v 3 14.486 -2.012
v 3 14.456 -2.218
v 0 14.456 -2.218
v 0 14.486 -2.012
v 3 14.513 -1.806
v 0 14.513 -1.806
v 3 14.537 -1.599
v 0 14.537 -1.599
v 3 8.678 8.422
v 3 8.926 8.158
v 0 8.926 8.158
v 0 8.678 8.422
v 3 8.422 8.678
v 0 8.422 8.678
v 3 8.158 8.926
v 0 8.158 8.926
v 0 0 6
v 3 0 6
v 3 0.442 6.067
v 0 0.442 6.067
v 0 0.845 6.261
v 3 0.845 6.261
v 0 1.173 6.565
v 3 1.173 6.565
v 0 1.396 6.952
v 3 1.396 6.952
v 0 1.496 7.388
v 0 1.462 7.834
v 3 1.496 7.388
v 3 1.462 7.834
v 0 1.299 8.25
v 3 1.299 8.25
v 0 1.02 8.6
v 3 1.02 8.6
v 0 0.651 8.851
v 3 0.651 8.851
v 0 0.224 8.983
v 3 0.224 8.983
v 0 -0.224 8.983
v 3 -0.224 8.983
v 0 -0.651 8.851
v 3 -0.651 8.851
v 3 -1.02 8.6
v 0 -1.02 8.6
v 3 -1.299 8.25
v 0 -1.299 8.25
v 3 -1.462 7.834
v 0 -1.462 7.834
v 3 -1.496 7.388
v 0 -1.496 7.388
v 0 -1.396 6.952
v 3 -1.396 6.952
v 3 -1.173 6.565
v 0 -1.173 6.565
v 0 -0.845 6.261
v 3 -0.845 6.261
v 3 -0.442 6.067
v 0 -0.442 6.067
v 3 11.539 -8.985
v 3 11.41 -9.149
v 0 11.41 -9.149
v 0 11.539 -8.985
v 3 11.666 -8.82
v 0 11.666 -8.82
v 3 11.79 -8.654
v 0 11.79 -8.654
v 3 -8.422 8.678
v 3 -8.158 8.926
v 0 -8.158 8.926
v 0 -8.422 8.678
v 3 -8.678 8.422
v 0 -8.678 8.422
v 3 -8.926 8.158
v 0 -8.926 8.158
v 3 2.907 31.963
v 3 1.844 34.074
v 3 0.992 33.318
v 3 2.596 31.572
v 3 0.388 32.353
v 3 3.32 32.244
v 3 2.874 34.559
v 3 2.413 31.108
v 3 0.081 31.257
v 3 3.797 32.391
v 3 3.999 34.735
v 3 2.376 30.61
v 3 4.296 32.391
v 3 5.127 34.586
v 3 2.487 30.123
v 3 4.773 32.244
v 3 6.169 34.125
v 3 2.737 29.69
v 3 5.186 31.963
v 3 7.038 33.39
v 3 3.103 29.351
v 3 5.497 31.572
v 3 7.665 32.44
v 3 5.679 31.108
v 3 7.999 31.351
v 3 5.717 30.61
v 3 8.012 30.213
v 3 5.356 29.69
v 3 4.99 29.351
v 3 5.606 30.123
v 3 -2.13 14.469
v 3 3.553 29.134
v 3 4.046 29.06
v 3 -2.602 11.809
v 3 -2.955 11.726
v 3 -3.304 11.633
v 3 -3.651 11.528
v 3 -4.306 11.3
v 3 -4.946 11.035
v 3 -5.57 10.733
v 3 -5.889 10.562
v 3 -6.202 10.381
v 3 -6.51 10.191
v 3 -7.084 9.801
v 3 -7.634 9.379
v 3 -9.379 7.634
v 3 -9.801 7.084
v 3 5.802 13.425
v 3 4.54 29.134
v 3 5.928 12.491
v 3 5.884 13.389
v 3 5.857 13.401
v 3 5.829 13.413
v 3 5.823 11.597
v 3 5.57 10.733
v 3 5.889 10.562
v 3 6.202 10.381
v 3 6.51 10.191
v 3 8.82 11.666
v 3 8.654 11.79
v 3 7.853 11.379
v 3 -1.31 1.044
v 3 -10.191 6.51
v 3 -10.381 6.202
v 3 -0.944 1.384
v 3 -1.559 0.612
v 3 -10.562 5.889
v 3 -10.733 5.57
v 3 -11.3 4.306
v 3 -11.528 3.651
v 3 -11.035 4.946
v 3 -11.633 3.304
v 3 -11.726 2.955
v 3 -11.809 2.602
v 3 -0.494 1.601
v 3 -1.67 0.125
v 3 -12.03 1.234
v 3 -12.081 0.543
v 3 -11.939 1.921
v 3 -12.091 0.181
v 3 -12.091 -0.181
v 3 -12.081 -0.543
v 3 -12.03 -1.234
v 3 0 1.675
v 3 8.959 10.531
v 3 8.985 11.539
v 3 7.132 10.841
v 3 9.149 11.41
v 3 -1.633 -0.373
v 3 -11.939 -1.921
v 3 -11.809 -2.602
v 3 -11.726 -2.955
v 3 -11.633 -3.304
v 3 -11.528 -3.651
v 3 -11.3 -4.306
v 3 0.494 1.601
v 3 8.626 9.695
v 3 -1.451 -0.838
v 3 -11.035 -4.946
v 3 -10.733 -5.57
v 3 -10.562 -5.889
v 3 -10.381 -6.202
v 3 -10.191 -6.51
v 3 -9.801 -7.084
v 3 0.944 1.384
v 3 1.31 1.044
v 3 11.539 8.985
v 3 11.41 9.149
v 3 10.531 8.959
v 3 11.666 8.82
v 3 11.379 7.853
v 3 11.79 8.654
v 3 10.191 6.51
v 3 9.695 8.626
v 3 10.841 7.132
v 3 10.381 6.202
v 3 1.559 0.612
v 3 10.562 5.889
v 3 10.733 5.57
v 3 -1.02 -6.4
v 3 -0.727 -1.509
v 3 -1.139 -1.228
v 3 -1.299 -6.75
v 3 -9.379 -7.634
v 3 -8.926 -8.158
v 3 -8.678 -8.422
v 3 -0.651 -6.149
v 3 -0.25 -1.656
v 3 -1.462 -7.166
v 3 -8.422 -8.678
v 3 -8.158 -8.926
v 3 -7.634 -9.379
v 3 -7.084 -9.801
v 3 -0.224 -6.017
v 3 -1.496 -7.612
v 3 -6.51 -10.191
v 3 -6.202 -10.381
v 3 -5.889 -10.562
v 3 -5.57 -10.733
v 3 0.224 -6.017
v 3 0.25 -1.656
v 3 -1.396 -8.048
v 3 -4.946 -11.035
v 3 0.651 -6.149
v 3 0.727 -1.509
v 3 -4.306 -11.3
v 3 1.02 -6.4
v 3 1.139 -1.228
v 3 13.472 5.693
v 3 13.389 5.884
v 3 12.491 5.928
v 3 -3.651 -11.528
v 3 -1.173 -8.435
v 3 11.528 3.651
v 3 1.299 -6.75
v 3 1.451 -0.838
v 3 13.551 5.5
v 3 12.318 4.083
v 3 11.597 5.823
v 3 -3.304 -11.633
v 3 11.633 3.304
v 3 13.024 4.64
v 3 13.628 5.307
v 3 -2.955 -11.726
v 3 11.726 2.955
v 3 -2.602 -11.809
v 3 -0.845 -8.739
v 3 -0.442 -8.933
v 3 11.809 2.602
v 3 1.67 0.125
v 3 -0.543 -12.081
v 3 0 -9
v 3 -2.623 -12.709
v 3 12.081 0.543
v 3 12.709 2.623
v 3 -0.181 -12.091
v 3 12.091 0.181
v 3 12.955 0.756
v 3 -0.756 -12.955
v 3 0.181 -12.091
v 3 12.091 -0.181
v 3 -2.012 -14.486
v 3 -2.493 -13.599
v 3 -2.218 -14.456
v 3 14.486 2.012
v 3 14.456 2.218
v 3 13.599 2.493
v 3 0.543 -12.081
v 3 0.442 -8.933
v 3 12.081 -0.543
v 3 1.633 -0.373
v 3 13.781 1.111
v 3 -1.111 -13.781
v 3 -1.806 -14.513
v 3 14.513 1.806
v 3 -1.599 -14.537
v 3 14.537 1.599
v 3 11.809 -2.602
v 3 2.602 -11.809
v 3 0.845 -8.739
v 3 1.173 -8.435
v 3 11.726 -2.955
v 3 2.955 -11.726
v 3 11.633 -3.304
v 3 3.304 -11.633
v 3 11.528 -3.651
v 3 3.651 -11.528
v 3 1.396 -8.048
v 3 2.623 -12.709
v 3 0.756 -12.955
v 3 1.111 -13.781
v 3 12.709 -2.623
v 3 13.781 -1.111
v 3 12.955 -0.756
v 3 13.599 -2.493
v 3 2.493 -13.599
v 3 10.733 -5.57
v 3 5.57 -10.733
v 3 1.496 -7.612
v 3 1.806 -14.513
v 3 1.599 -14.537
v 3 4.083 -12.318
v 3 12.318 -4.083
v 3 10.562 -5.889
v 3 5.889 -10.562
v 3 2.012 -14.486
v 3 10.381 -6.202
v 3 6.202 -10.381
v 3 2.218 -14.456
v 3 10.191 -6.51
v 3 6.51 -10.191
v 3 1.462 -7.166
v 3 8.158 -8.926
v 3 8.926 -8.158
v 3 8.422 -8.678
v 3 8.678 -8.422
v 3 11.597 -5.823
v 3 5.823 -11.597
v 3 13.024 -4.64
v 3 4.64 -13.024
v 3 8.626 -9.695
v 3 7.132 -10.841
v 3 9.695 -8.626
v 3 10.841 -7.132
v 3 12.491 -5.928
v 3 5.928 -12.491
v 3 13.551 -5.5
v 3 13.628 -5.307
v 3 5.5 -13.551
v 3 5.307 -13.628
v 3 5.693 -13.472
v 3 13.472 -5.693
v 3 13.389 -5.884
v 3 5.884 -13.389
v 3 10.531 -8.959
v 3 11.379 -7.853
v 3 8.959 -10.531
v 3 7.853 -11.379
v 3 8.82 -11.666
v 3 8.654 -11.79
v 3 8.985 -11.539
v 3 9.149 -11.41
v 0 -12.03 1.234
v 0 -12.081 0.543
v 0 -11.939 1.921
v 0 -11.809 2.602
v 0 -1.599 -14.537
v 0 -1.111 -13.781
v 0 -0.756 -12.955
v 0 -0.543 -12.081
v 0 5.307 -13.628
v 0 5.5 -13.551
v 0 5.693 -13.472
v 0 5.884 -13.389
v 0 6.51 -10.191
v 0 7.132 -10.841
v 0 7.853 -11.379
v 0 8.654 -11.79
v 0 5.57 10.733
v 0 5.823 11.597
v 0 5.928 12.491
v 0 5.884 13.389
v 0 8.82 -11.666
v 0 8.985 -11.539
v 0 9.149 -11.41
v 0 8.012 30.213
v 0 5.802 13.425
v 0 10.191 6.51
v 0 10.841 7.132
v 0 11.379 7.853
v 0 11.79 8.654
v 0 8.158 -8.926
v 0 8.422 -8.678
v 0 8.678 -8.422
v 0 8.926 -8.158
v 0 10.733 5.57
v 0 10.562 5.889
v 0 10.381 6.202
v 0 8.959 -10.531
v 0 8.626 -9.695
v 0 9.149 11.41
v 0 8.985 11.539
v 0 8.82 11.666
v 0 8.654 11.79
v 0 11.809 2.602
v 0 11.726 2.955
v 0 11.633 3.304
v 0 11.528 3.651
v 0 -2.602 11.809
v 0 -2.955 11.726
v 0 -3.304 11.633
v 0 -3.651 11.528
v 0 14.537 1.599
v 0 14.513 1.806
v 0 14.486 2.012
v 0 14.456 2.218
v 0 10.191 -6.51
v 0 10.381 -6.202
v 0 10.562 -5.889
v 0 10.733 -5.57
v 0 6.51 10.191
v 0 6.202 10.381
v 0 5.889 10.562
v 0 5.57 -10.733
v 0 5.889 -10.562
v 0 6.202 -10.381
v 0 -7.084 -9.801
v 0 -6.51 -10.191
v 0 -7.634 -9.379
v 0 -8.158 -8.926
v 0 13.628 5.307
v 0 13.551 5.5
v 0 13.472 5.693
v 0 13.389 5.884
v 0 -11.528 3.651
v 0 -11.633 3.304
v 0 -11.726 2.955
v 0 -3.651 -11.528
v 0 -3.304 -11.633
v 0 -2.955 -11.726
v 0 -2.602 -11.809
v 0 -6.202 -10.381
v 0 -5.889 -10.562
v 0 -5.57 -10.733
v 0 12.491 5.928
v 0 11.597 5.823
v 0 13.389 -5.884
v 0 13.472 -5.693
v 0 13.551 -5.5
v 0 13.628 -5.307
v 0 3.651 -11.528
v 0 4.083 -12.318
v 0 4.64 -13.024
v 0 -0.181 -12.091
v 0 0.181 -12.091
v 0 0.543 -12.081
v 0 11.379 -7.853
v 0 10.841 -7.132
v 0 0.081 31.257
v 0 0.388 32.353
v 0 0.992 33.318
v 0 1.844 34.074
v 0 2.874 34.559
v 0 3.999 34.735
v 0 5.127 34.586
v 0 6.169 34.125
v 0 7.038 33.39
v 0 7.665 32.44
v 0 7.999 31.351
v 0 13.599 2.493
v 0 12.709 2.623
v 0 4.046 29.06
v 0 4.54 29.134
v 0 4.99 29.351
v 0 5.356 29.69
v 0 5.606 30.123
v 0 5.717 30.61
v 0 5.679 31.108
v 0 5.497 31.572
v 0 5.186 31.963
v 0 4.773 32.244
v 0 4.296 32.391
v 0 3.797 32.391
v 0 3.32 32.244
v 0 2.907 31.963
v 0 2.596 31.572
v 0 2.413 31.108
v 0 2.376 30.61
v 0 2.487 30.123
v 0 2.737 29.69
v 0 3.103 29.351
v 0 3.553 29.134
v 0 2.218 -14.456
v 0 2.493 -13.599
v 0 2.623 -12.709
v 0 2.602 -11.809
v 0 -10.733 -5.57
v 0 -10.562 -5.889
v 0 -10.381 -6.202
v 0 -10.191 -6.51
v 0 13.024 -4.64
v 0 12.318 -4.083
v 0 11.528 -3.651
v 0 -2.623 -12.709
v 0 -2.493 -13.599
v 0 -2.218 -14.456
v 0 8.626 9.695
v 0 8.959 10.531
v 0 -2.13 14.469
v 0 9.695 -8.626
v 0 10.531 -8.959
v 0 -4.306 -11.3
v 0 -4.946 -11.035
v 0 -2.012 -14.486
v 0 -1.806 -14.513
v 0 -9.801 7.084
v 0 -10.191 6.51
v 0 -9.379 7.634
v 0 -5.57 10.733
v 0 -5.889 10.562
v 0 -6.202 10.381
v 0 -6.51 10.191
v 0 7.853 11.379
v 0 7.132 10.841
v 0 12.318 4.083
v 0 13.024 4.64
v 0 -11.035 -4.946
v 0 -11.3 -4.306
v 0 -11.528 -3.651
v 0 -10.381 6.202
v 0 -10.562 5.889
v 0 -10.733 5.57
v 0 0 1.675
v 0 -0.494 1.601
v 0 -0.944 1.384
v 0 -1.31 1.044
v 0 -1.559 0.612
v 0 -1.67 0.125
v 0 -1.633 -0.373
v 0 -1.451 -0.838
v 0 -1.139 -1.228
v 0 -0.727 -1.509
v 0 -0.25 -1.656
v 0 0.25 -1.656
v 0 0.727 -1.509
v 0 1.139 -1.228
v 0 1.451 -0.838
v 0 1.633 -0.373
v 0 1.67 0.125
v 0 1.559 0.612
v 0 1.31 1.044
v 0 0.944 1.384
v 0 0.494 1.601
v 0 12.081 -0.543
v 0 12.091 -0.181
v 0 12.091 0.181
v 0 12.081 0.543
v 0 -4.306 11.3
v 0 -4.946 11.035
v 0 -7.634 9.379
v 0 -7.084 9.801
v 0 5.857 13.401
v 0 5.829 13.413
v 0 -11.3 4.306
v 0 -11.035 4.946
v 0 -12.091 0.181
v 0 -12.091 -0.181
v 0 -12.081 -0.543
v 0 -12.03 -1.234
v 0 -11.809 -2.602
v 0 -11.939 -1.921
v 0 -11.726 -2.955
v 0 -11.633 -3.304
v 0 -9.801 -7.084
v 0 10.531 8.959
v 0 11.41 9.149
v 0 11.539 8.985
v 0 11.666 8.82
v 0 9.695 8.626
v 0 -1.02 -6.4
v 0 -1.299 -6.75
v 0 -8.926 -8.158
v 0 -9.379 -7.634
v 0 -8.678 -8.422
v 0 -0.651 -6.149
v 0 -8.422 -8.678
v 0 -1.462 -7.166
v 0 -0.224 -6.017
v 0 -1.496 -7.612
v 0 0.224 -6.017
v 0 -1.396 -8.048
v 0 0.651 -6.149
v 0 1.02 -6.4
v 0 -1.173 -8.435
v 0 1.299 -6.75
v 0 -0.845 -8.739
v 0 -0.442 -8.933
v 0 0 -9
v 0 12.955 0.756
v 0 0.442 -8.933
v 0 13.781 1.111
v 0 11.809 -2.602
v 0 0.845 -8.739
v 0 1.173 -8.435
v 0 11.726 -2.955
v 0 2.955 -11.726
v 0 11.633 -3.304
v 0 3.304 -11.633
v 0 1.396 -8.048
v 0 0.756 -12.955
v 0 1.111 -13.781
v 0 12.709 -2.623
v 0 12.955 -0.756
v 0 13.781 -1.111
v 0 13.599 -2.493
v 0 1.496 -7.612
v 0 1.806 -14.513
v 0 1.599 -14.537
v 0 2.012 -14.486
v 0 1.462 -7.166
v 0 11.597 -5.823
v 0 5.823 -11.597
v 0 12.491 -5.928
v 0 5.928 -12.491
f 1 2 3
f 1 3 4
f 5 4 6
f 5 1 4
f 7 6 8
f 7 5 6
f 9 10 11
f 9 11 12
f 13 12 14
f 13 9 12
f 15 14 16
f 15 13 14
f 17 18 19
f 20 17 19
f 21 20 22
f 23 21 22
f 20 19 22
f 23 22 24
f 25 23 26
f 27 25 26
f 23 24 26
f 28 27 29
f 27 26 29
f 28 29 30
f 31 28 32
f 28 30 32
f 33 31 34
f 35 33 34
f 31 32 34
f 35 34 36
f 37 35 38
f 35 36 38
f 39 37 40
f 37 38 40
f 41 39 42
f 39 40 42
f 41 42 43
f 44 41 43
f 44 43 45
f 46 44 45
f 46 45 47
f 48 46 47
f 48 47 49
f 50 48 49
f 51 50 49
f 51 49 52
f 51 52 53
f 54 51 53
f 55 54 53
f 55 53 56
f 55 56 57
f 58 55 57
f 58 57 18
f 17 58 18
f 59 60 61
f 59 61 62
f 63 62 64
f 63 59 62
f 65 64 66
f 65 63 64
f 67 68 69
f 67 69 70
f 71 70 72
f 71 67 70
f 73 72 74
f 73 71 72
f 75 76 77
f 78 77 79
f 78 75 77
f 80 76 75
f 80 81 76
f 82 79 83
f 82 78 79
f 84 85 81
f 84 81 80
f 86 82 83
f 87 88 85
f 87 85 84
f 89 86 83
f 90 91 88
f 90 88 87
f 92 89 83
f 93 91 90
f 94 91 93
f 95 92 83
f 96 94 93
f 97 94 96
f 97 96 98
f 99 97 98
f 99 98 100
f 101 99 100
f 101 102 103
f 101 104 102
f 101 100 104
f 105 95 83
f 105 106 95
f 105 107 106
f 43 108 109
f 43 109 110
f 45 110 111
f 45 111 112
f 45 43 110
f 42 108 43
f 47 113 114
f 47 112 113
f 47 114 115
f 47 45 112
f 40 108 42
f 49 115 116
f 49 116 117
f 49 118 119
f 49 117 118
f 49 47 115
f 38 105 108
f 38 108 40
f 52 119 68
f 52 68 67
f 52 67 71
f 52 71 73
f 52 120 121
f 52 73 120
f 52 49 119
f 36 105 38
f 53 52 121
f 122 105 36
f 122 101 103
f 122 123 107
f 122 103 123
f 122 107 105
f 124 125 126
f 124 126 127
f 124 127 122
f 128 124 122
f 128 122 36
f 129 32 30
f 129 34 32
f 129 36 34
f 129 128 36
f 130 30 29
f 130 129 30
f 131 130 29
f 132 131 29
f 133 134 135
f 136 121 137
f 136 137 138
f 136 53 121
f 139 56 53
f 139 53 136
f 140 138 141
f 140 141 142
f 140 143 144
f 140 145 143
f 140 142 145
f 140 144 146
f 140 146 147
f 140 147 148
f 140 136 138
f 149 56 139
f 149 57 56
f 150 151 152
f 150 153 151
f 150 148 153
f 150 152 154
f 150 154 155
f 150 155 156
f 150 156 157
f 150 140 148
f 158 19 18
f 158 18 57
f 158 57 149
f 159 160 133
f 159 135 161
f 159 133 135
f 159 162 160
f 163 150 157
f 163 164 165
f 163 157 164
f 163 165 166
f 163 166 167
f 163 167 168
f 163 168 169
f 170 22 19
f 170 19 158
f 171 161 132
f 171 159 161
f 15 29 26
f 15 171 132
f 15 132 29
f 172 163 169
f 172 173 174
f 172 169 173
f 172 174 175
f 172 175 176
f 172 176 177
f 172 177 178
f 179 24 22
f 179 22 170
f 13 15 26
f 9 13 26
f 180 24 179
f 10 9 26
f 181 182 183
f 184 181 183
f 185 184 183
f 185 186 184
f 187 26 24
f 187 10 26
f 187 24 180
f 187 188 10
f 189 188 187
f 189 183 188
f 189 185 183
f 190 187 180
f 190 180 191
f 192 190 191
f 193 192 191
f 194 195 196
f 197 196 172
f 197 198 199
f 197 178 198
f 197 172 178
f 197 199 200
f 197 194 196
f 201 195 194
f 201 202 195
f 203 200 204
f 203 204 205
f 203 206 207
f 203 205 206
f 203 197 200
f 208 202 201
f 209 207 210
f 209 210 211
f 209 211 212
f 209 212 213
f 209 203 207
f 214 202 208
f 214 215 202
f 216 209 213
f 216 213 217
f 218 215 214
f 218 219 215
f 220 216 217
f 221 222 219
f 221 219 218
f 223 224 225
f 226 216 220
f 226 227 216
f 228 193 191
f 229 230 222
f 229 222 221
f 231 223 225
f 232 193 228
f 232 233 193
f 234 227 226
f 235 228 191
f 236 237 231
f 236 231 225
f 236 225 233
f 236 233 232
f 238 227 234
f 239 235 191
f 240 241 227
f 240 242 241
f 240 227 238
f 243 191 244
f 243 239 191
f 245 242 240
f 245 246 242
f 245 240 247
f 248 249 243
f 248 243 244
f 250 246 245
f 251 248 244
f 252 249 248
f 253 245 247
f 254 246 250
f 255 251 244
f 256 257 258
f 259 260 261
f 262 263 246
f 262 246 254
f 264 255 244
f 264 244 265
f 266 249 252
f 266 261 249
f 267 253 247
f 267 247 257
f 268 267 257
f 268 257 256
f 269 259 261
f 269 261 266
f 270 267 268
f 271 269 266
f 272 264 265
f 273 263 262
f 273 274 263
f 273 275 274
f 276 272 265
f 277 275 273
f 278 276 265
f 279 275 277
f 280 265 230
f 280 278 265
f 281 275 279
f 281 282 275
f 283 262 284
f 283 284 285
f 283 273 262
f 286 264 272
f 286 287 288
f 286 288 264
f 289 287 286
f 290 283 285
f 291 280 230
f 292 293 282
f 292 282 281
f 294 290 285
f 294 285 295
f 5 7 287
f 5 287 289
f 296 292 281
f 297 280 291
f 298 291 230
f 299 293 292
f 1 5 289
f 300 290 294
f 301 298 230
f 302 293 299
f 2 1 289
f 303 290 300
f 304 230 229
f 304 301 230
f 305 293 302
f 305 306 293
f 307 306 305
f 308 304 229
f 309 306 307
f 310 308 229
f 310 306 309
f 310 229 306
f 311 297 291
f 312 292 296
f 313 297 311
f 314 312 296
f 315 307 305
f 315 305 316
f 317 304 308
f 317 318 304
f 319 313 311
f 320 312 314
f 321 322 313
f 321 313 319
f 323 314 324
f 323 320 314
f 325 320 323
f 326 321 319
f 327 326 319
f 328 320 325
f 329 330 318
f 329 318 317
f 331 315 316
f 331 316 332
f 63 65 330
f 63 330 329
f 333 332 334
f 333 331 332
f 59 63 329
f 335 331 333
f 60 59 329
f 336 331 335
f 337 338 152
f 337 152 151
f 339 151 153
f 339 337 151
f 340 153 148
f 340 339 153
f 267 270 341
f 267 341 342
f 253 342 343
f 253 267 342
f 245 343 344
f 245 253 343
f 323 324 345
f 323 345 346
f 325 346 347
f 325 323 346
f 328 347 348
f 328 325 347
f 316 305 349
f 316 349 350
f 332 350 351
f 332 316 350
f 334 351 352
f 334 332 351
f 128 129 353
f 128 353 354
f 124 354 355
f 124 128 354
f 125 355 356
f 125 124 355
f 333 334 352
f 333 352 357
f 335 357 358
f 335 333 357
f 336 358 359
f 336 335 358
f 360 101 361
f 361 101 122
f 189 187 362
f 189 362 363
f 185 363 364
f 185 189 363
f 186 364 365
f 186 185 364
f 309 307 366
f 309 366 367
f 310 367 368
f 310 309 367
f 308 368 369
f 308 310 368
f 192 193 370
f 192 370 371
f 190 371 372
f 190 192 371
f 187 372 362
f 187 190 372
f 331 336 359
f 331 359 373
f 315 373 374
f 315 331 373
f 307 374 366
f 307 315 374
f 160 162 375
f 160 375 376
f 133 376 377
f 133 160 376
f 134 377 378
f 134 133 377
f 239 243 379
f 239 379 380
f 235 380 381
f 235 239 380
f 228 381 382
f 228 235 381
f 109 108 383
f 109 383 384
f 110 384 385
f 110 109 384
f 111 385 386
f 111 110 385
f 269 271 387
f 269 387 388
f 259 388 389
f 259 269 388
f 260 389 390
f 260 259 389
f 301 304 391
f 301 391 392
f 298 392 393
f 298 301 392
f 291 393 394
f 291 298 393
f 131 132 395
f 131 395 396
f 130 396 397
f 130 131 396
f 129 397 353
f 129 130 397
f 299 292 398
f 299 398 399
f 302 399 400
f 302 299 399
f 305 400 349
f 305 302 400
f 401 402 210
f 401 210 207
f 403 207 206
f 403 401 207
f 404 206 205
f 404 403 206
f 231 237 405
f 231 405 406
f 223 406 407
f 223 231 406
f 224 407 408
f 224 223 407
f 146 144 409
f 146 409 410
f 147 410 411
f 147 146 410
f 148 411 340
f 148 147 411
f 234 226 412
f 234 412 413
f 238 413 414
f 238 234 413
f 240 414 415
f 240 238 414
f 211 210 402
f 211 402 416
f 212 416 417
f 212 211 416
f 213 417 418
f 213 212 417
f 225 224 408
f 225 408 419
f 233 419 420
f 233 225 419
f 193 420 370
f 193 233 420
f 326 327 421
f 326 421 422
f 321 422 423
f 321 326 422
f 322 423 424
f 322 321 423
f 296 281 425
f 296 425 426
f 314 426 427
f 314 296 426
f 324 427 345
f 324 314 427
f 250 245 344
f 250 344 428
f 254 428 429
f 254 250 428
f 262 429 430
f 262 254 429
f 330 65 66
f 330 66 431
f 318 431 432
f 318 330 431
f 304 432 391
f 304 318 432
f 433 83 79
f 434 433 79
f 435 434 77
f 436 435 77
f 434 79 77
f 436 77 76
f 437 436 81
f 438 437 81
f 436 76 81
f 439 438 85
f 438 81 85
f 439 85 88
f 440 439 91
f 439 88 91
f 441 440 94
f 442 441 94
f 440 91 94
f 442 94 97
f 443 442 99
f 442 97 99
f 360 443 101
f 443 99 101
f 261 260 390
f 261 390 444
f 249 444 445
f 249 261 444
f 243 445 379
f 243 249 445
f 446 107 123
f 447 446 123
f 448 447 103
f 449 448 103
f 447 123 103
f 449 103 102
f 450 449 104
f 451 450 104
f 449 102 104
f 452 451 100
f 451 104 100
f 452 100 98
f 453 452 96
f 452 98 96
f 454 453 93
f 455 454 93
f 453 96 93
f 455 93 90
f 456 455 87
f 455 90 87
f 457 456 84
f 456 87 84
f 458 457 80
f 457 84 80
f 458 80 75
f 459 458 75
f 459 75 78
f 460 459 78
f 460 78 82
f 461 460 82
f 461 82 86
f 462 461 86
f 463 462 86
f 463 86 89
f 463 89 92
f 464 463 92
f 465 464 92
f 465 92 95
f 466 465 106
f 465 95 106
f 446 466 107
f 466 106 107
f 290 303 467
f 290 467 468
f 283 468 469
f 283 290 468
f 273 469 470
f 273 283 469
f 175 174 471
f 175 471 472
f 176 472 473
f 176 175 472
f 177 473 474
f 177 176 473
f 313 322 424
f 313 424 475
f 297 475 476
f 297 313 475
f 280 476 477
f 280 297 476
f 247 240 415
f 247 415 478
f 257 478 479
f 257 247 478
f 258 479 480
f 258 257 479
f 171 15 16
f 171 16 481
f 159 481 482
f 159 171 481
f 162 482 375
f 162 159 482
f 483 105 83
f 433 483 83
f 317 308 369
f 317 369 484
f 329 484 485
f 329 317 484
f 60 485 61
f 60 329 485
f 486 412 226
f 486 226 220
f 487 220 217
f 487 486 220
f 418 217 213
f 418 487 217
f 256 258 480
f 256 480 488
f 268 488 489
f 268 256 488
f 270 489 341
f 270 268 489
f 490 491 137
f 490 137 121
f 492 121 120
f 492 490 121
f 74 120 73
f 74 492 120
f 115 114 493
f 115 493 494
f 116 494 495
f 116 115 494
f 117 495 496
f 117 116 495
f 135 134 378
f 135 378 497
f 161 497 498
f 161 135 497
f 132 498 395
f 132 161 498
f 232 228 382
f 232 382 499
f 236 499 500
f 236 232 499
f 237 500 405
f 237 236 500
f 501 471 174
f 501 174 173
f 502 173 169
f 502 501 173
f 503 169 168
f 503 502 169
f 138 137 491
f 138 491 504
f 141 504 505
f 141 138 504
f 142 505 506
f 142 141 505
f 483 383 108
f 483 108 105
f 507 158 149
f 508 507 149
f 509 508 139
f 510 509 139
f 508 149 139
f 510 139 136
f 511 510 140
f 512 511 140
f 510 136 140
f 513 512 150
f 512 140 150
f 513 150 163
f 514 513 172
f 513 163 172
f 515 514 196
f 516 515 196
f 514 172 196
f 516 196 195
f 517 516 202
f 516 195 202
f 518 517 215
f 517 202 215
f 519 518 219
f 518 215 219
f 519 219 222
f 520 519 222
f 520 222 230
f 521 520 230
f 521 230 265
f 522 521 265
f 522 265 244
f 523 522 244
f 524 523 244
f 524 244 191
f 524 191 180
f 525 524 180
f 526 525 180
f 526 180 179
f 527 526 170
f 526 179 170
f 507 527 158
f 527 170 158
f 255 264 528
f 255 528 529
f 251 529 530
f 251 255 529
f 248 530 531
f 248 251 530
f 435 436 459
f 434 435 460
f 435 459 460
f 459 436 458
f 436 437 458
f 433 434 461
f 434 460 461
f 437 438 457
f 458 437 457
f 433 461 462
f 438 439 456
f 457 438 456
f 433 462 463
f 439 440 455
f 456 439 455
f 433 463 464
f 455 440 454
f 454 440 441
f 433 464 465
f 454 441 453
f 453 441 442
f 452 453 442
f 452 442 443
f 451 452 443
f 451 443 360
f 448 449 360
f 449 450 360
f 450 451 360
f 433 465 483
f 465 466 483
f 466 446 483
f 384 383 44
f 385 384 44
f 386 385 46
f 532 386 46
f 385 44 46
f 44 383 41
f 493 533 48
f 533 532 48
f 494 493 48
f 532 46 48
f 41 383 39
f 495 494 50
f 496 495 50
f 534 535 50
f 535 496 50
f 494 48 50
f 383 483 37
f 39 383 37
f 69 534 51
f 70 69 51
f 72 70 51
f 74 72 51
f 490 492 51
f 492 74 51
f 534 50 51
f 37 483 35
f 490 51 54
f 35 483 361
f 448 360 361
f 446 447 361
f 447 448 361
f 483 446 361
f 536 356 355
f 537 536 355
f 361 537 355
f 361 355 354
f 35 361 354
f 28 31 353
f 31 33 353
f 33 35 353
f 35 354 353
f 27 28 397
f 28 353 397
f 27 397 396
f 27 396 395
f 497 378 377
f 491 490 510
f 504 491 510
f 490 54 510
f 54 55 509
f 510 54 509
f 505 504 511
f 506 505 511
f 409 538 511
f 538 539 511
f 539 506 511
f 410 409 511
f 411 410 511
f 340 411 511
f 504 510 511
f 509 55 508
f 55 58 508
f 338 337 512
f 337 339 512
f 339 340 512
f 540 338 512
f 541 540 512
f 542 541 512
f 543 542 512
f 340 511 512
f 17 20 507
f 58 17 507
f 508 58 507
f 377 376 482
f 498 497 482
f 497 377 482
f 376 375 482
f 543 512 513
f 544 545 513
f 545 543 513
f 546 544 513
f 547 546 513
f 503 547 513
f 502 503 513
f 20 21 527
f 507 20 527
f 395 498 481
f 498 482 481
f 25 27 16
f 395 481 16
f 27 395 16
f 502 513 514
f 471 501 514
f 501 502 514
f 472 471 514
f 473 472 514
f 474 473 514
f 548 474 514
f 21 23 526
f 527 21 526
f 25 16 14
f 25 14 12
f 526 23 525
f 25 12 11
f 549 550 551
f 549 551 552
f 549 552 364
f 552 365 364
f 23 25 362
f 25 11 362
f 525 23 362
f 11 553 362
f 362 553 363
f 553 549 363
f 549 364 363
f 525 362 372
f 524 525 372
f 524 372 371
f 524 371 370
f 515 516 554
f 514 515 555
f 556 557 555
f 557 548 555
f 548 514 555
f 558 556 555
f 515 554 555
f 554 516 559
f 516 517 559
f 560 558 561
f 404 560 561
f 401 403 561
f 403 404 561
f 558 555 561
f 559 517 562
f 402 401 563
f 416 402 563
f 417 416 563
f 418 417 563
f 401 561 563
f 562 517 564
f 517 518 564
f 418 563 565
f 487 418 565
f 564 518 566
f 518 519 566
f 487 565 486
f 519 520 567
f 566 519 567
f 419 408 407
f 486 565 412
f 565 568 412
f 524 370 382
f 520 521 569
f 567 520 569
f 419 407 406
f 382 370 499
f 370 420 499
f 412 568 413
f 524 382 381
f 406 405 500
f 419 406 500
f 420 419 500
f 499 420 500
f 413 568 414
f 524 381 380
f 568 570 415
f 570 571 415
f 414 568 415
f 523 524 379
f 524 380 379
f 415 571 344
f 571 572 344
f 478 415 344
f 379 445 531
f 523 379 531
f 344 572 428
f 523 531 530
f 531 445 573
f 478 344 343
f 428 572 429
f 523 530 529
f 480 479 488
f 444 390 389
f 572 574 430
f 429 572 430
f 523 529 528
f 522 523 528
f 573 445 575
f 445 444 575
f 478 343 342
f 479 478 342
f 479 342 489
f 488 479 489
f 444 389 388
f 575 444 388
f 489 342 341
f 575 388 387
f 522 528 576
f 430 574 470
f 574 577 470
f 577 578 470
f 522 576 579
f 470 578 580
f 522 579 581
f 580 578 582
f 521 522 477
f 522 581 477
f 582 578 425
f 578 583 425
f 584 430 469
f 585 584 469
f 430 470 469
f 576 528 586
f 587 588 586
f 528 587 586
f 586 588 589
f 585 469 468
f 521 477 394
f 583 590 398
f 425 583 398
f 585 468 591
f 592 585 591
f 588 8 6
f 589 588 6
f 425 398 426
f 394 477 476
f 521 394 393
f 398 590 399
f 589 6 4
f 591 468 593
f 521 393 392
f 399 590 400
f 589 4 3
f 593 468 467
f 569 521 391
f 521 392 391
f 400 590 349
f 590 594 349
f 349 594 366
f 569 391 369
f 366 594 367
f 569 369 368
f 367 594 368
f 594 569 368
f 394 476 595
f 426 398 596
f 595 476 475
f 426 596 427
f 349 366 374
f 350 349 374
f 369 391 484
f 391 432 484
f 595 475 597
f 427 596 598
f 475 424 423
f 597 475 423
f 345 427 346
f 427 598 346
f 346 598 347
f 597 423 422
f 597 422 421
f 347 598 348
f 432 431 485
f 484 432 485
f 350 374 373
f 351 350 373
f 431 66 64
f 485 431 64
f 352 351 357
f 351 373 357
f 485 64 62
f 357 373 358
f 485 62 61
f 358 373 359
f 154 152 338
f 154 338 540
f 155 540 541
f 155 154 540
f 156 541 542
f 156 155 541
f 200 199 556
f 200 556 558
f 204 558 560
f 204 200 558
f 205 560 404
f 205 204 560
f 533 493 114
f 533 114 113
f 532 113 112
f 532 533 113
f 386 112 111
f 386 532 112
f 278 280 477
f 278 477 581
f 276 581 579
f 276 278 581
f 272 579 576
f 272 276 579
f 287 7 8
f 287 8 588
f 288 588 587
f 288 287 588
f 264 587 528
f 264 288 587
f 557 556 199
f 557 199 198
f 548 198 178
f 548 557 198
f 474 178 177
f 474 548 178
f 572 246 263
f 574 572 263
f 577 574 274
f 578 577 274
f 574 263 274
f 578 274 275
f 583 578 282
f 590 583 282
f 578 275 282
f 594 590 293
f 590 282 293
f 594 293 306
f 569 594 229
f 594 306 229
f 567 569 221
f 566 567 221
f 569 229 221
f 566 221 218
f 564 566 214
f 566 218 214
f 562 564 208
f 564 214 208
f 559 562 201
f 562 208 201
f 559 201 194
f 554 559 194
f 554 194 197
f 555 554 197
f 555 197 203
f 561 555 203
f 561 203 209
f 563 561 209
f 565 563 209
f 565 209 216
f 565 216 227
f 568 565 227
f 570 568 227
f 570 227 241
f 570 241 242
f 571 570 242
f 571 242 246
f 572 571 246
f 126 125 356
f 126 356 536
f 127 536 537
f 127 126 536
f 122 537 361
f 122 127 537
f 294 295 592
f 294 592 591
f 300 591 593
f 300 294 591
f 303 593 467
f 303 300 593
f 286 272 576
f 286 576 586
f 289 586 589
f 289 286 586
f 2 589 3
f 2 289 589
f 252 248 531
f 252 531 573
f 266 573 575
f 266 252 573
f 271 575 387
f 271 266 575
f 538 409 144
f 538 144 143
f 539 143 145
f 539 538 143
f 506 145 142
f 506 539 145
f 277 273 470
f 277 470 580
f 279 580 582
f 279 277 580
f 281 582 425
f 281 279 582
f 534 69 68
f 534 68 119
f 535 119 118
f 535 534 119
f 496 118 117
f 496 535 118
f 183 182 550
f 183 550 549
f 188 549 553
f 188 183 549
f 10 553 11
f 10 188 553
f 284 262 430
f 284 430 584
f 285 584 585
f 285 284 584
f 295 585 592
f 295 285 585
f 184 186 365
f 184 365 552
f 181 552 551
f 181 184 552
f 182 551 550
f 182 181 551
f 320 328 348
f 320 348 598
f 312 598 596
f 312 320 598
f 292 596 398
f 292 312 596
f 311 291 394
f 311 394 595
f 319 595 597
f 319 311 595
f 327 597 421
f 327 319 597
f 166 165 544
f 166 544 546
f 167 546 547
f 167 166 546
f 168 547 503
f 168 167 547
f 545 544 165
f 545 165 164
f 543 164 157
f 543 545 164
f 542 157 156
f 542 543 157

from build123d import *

# Parameters (mm, degrees)
SKETCH1_R           = 1.675
BOSS_EXTRUDE1_DEPTH = 3
SKETCH2_R           = 1.675
BOSS_EXTRUDE2_DEPTH = 3
CUT_EXTRUDE1_START  = -3
CUT_EXTRUDE1_DEPTH  = 3
SKETCH4_R           = 1.5
CUT_EXTRUDE2_DEPTH  = 38.773525245


# Read off the part's stored shape, not the designer's step: Cut-Extrude1
with BuildPart() as part:
    # Sketch1 → Boss-Extrude1 (new body)
    with BuildSketch(Plane(origin=(3, 0, 0), x_dir=(0, 0, -1), z_dir=(1, 0, 0))):
        with BuildLine():
            ThreePointArc((-14.537314892, 1.599093719), (-13.375367565, 0.916420874), (-12.080565177, 0.542722358))
            ThreePointArc((-12.080565177, 0.542722358), (-12.09275, 0), (-12.080565177, -0.542722358))
            ThreePointArc((-12.080565177, -0.542722358), (-13.375367565, -0.916420874), (-14.537314892, -1.599093719))
            ThreePointArc((-14.537314892, -1.599093719), (-14.499881098, -1.908945561), (-14.455843809, -2.217928037))
            ThreePointArc((-14.455843809, -2.217928037), (-13.156800143, -2.576605271), (-11.809396783, -2.602450802))
            ThreePointArc((-11.809396783, -2.602450802), (-11.680699536, -3.129834008), (-11.528463019, -3.650909885))
            ThreePointArc((-11.528463019, -3.650909885), (-12.682425791, -4.346994451), (-13.62809199, -5.30713988))
            ThreePointArc((-13.62809199, -5.30713988), (-13.511738163, -5.596745198), (-13.389230859, -5.883801663))
            ThreePointArc((-13.389230859, -5.883801663), (-12.041618533, -5.894040025), (-10.733437515, -5.57027124))
            ThreePointArc((-10.733437515, -5.57027124), (-10.472628702, -6.046375), (-10.190715157, -6.510293938))
            ThreePointArc((-10.190715157, -6.510293938), (-11.125197659, -7.48132754), (-11.79013714, -8.65351323))
            ThreePointArc((-11.79013714, -8.65351323), (-11.602792602, -8.903135899), (-11.410163953, -9.148703928))
            ThreePointArc((-11.410163953, -9.148703928), (-10.105820521, -8.809805691), (-8.926012217, -8.158486898))
            ThreePointArc((-8.926012217, -8.158486898), (-8.550865528, -8.550865528), (-8.158486898, -8.926012217))
            ThreePointArc((-8.158486898, -8.926012217), (-8.809805691, -10.105820521), (-9.148703928, -11.410163953))
            ThreePointArc((-9.148703928, -11.410163953), (-8.903135899, -11.602792602), (-8.65351323, -11.79013714))
            ThreePointArc((-8.65351323, -11.79013714), (-7.48132754, -11.125197659), (-6.510293938, -10.190715157))
            ThreePointArc((-6.510293938, -10.190715157), (-6.046375, -10.472628702), (-5.57027124, -10.733437515))
            ThreePointArc((-5.57027124, -10.733437515), (-5.894040025, -12.041618533), (-5.883801663, -13.389230859))
            ThreePointArc((-5.883801663, -13.389230859), (-5.596745198, -13.511738163), (-5.30713988, -13.62809199))
            ThreePointArc((-5.30713988, -13.62809199), (-4.346994451, -12.682425791), (-3.650909885, -11.528463019))
            ThreePointArc((-3.650909885, -11.528463019), (-3.129834008, -11.680699536), (-2.602450802, -11.809396783))
            ThreePointArc((-2.602450802, -11.809396783), (-2.576605271, -13.156800143), (-2.217928037, -14.455843809))
            ThreePointArc((-2.217928037, -14.455843809), (-1.908945561, -14.499881098), (-1.599093719, -14.537314892))
            ThreePointArc((-1.599093719, -14.537314892), (-0.916420874, -13.375367565), (-0.542722358, -12.080565177))
            ThreePointArc((-0.542722358, -12.080565177), (0, -12.09275), (0.542722358, -12.080565177))
            ThreePointArc((0.542722358, -12.080565177), (0.916420874, -13.375367565), (1.599093719, -14.537314892))
            ThreePointArc((1.599093719, -14.537314892), (1.908945561, -14.499881098), (2.217928037, -14.455843809))
            ThreePointArc((2.217928037, -14.455843809), (2.576605271, -13.156800143), (2.602450802, -11.809396783))
            ThreePointArc((2.602450802, -11.809396783), (3.129834008, -11.680699536), (3.650909885, -11.528463019))
            ThreePointArc((3.650909885, -11.528463019), (4.346994451, -12.682425791), (5.30713988, -13.62809199))
            ThreePointArc((5.30713988, -13.62809199), (5.596745198, -13.511738163), (5.883801663, -13.389230859))
            ThreePointArc((5.883801663, -13.389230859), (5.894040025, -12.041618533), (5.57027124, -10.733437515))
            ThreePointArc((5.57027124, -10.733437515), (6.046375, -10.472628702), (6.510293938, -10.190715157))
            ThreePointArc((6.510293938, -10.190715157), (7.48132754, -11.125197659), (8.65351323, -11.79013714))
            ThreePointArc((8.65351323, -11.79013714), (8.903135899, -11.602792602), (9.148703928, -11.410163953))
            ThreePointArc((9.148703928, -11.410163953), (8.809805691, -10.105820521), (8.158486898, -8.926012217))
            ThreePointArc((8.158486898, -8.926012217), (8.550865528, -8.550865528), (8.926012217, -8.158486898))
            ThreePointArc((8.926012217, -8.158486898), (10.105820521, -8.809805691), (11.410163953, -9.148703928))
            ThreePointArc((11.410163953, -9.148703928), (11.602792602, -8.903135899), (11.79013714, -8.65351323))
            ThreePointArc((11.79013714, -8.65351323), (11.125197659, -7.48132754), (10.190715157, -6.510293938))
            ThreePointArc((10.190715157, -6.510293938), (10.472628702, -6.046375), (10.733437515, -5.57027124))
            ThreePointArc((10.733437515, -5.57027124), (12.041618533, -5.894040025), (13.389230859, -5.883801663))
            ThreePointArc((13.389230859, -5.883801663), (13.511738163, -5.596745198), (13.62809199, -5.30713988))
            ThreePointArc((13.62809199, -5.30713988), (12.682425791, -4.346994451), (11.528463019, -3.650909885))
            ThreePointArc((11.528463019, -3.650909885), (11.680699536, -3.129834008), (11.809396783, -2.602450802))
            ThreePointArc((11.809396783, -2.602450802), (13.156800143, -2.576605271), (14.455843809, -2.217928037))
            ThreePointArc((14.455843809, -2.217928037), (14.499881098, -1.908945561), (14.537314892, -1.599093719))
            ThreePointArc((14.537314892, -1.599093719), (13.375367565, -0.916420874), (12.080565177, -0.542722358))
            ThreePointArc((12.080565177, -0.542722358), (12.09275, 0), (12.080565177, 0.542722358))
            ThreePointArc((12.080565177, 0.542722358), (13.375367565, 0.916420874), (14.537314892, 1.599093719))
            ThreePointArc((14.537314892, 1.599093719), (14.499881098, 1.908945561), (14.455843809, 2.217928037))
            ThreePointArc((14.455843809, 2.217928037), (13.156800143, 2.576605271), (11.809396783, 2.602450802))
            ThreePointArc((11.809396783, 2.602450802), (11.680699536, 3.129834008), (11.528463019, 3.650909885))
            ThreePointArc((11.528463019, 3.650909885), (12.682425791, 4.346994451), (13.62809199, 5.30713988))
            ThreePointArc((13.62809199, 5.30713988), (13.511738163, 5.596745198), (13.389230859, 5.883801663))
            ThreePointArc((13.389230859, 5.883801663), (12.041618533, 5.894040025), (10.733437515, 5.57027124))
            ThreePointArc((10.733437515, 5.57027124), (10.472628702, 6.046375), (10.190715157, 6.510293938))
            ThreePointArc((10.190715157, 6.510293938), (11.125197659, 7.48132754), (11.79013714, 8.65351323))
            ThreePointArc((11.79013714, 8.65351323), (11.602792602, 8.903135899), (11.410163953, 9.148703928))
            ThreePointArc((11.410163953, 9.148703928), (10.105820521, 8.809805691), (8.926012217, 8.158486898))
            ThreePointArc((8.926012217, 8.158486898), (8.550865528, 8.550865528), (8.158486898, 8.926012217))
            ThreePointArc((8.158486898, 8.926012217), (8.809805691, 10.105820521), (9.148703928, 11.410163953))
            ThreePointArc((9.148703928, 11.410163953), (8.903135899, 11.602792602), (8.65351323, 11.79013714))
            ThreePointArc((8.65351323, 11.79013714), (7.48132754, 11.125197659), (6.510293938, 10.190715157))
            ThreePointArc((6.510293938, 10.190715157), (6.046375, 10.472628702), (5.57027124, 10.733437515))
            ThreePointArc((5.57027124, 10.733437515), (5.894040025, 12.041618533), (5.883801663, 13.389230859))
            ThreePointArc((5.883801663, 13.389230859), (5.596745198, 13.511738163), (5.30713988, 13.62809199))
            ThreePointArc((5.30713988, 13.62809199), (4.346994451, 12.682425791), (3.650909885, 11.528463019))
            ThreePointArc((3.650909885, 11.528463019), (3.129834008, 11.680699536), (2.602450802, 11.809396783))
            ThreePointArc((2.602450802, 11.809396783), (2.576605271, 13.156800143), (2.217928037, 14.455843809))
            ThreePointArc((2.217928037, 14.455843809), (1.908945561, 14.499881098), (1.599093719, 14.537314892))
            ThreePointArc((1.599093719, 14.537314892), (0.916420874, 13.375367565), (0.542722358, 12.080565177))
            ThreePointArc((0.542722358, 12.080565177), (0, 12.09275), (-0.542722358, 12.080565177))
            ThreePointArc((-0.542722358, 12.080565177), (-0.916420874, 13.375367565), (-1.599093719, 14.537314892))
            ThreePointArc((-1.599093719, 14.537314892), (-1.908945561, 14.499881098), (-2.217928037, 14.455843809))
            ThreePointArc((-2.217928037, 14.455843809), (-2.576605271, 13.156800143), (-2.602450802, 11.809396783))
            ThreePointArc((-2.602450802, 11.809396783), (-3.129834008, 11.680699536), (-3.650909885, 11.528463019))
            ThreePointArc((-3.650909885, 11.528463019), (-4.346994451, 12.682425791), (-5.30713988, 13.62809199))
            ThreePointArc((-5.30713988, 13.62809199), (-5.596745198, 13.511738163), (-5.883801663, 13.389230859))
            ThreePointArc((-5.883801663, 13.389230859), (-5.894040025, 12.041618533), (-5.57027124, 10.733437515))
            ThreePointArc((-5.57027124, 10.733437515), (-6.046375, 10.472628702), (-6.510293938, 10.190715157))
            ThreePointArc((-6.510293938, 10.190715157), (-7.48132754, 11.125197659), (-8.65351323, 11.79013714))
            ThreePointArc((-8.65351323, 11.79013714), (-8.903135899, 11.602792602), (-9.148703928, 11.410163953))
            ThreePointArc((-9.148703928, 11.410163953), (-8.809805691, 10.105820521), (-8.158486898, 8.926012217))
            ThreePointArc((-8.158486898, 8.926012217), (-8.550865528, 8.550865528), (-8.926012217, 8.158486898))
            ThreePointArc((-8.926012217, 8.158486898), (-10.105820521, 8.809805691), (-11.410163953, 9.148703928))
            ThreePointArc((-11.410163953, 9.148703928), (-11.602792602, 8.903135899), (-11.79013714, 8.65351323))
            ThreePointArc((-11.79013714, 8.65351323), (-11.125197659, 7.48132754), (-10.190715157, 6.510293938))
            ThreePointArc((-10.190715157, 6.510293938), (-10.472628702, 6.046375), (-10.733437515, 5.57027124))
            ThreePointArc((-10.733437515, 5.57027124), (-12.041618533, 5.894040025), (-13.389230859, 5.883801663))
            ThreePointArc((-13.389230859, 5.883801663), (-13.511738163, 5.596745198), (-13.62809199, 5.30713988))
            ThreePointArc((-13.62809199, 5.30713988), (-12.682425791, 4.346994451), (-11.528463019, 3.650909885))
            ThreePointArc((-11.528463019, 3.650909885), (-11.680699536, 3.129834008), (-11.809396783, 2.602450802))
            ThreePointArc((-11.809396783, 2.602450802), (-13.156800143, 2.576605271), (-14.455843809, 2.217928037))
            ThreePointArc((-14.455843809, 2.217928037), (-14.499881098, 1.908945561), (-14.537314892, 1.599093719))
        make_face()
        with Locations(Location((0, 0, 0), (0, 0, 180))):
            Circle(SKETCH1_R, mode=Mode.SUBTRACT)
    extrude(amount=-BOSS_EXTRUDE1_DEPTH)

    # Sketch2 → Boss-Extrude2 (add)
    with BuildSketch(Plane(origin=(3, 0, 0), x_dir=(0, 0, -1), z_dir=(1, 0, 0))):
        with BuildLine():
            Line((-0.522104769, -3.965779445), (-31.256895471, 0.080532513))
            ThreePointArc((-31.256895471, 0.080532513), (-34.700570148, 4.568416728), (-30.212685934, 8.012091404))
            Line((-30.212685934, 8.012091404), (0.522104769, 3.965779445))
            ThreePointArc((0.522104769, 3.965779445), (3.965779445, -0.522104769), (-0.522104769, -3.965779445))
        make_face()
        with Locations((-30.734790703, 4.046311959)):
            Circle(SKETCH2_R, mode=Mode.SUBTRACT)
        with Locations(Location((0, 0, 0), (0, 0, 180))):
            Circle(SKETCH2_R, mode=Mode.SUBTRACT)
    extrude(amount=-BOSS_EXTRUDE2_DEPTH)

    # Cut-Extrude1 outline → Cut-Extrude1 (cut)
    with BuildSketch(Plane(origin=(3, 0, 0), x_dir=(0, 0, -1), z_dir=(1, 0, 0)).offset(CUT_EXTRUDE1_START)):
        with BuildLine():
            ThreePointArc((-14.455843809, -2.217928037), (-13.156800143, -2.576605271), (-11.809396783, -2.602450802))
            Line((-11.809396783, -2.602450802), (-14.469116823, -2.129620475))
            ThreePointArc((-14.469116823, -2.129620475), (-14.462547716, -2.173784387), (-14.455843809, -2.217928037))
        make_face()
        with BuildLine():
            ThreePointArc((11.528463018, -3.650909885), (11.172244217, -4.627695076), (10.733437514, -5.57027124))
            ThreePointArc((10.733437514, -5.57027124), (12.041618534, -5.894040025), (13.389230859, -5.883801663))
            ThreePointArc((13.389230859, -5.883801663), (13.511738163, -5.596745198), (13.62809199, -5.30713988))
            ThreePointArc((13.62809199, -5.30713988), (12.682425791, -4.346994451), (11.528463018, -3.650909885))
        make_face()
        with BuildLine():
            ThreePointArc((10.190715157, -6.510293938), (9.593823606, -7.361599771), (8.926012217, -8.158486898))
            ThreePointArc((8.926012217, -8.158486898), (10.105820521, -8.809805691), (11.410163953, -9.148703928))
            ThreePointArc((11.410163953, -9.148703928), (11.602792602, -8.903135899), (11.79013714, -8.65351323))
            ThreePointArc((11.79013714, -8.65351323), (11.125197659, -7.48132754), (10.190715157, -6.510293938))
        make_face()
        with BuildLine():
            ThreePointArc((8.158486898, -8.926012217), (7.361599771, -9.593823606), (6.510293938, -10.190715157))
            ThreePointArc((6.510293938, -10.190715157), (7.48132754, -11.125197659), (8.65351323, -11.79013714))
            ThreePointArc((8.65351323, -11.79013714), (8.903135899, -11.602792602), (9.148703928, -11.410163953))
            ThreePointArc((9.148703928, -11.410163953), (8.809805691, -10.105820521), (8.158486898, -8.926012217))
        make_face()
        with BuildLine():
            ThreePointArc((5.57027124, -10.733437514), (4.627695077, -11.172244217), (3.650909885, -11.528463019))
            ThreePointArc((3.650909885, -11.528463019), (4.346994451, -12.682425791), (5.30713988, -13.62809199))
            ThreePointArc((5.30713988, -13.62809199), (5.596745198, -13.511738163), (5.883801663, -13.389230859))
            ThreePointArc((5.883801663, -13.389230859), (5.894040025, -12.041618534), (5.57027124, -10.733437514))
        make_face()
        with BuildLine():
            ThreePointArc((2.602450802, -11.809396783), (1.578420611, -11.989294847), (0.542722358, -12.080565177))
            ThreePointArc((0.542722358, -12.080565177), (0.916420874, -13.375367565), (1.599093719, -14.537314892))
            ThreePointArc((1.599093719, -14.537314892), (1.908945561, -14.499881098), (2.217928037, -14.455843809))
            ThreePointArc((2.217928037, -14.455843809), (2.576605271, -13.156800143), (2.602450802, -11.809396783))
        make_face()
        with BuildLine():
            ThreePointArc((-0.542722358, -12.080565177), (-1.578420611, -11.989294847), (-2.602450802, -11.809396783))
            ThreePointArc((-2.602450802, -11.809396783), (-2.576605271, -13.156800143), (-2.217928037, -14.455843809))
            ThreePointArc((-2.217928037, -14.455843809), (-1.908945561, -14.499881098), (-1.599093719, -14.537314892))
            ThreePointArc((-1.599093719, -14.537314892), (-0.916420874, -13.375367565), (-0.542722358, -12.080565177))
        make_face()
        with BuildLine():
            ThreePointArc((-3.650909885, -11.528463019), (-4.627695077, -11.172244217), (-5.57027124, -10.733437514))
            ThreePointArc((-5.57027124, -10.733437514), (-5.894040025, -12.041618534), (-5.883801663, -13.389230859))
            ThreePointArc((-5.883801663, -13.389230859), (-5.596745198, -13.511738163), (-5.30713988, -13.62809199))
            ThreePointArc((-5.30713988, -13.62809199), (-4.346994451, -12.682425791), (-3.650909885, -11.528463019))
        make_face()
        with BuildLine():
            ThreePointArc((-6.510293938, -10.190715157), (-7.361599771, -9.593823606), (-8.158486898, -8.926012217))
            ThreePointArc((-8.158486898, -8.926012217), (-8.809805691, -10.105820521), (-9.148703928, -11.410163953))
            ThreePointArc((-9.148703928, -11.410163953), (-8.903135899, -11.602792602), (-8.65351323, -11.79013714))
            ThreePointArc((-8.65351323, -11.79013714), (-7.48132754, -11.125197659), (-6.510293938, -10.190715157))
        make_face()
        with BuildLine():
            ThreePointArc((-8.926012217, -8.158486898), (-9.593823606, -7.361599771), (-10.190715157, -6.510293938))
            ThreePointArc((-10.190715157, -6.510293938), (-11.125197659, -7.48132754), (-11.79013714, -8.65351323))
            ThreePointArc((-11.79013714, -8.65351323), (-11.602792602, -8.903135899), (-11.410163953, -9.148703928))
            ThreePointArc((-11.410163953, -9.148703928), (-10.105820521, -8.809805691), (-8.926012217, -8.158486898))
        make_face()
        with BuildLine():
            ThreePointArc((-10.733437514, -5.57027124), (-11.172244217, -4.627695076), (-11.528463018, -3.650909885))
            ThreePointArc((-11.528463018, -3.650909885), (-12.682425791, -4.346994451), (-13.62809199, -5.30713988))
            ThreePointArc((-13.62809199, -5.30713988), (-13.511738163, -5.596745198), (-13.389230859, -5.883801663))
            ThreePointArc((-13.389230859, -5.883801663), (-12.041618534, -5.894040025), (-10.733437514, -5.57027124))
        make_face()
    extrude(amount=CUT_EXTRUDE1_DEPTH, mode=Mode.SUBTRACT)

    # Sketch4 → Cut-Extrude2 (cut, through all)
    with BuildSketch(Plane(origin=(3, 0, 0), x_dir=(0, 0, -1), z_dir=(1, 0, 0))):
        with Locations((-7.5, 0)):
            Circle(SKETCH4_R)
        with Locations((7.5, 0)):
            Circle(SKETCH4_R)
    extrude(amount=-CUT_EXTRUDE2_DEPTH, mode=Mode.SUBTRACT)


solid = part.part
